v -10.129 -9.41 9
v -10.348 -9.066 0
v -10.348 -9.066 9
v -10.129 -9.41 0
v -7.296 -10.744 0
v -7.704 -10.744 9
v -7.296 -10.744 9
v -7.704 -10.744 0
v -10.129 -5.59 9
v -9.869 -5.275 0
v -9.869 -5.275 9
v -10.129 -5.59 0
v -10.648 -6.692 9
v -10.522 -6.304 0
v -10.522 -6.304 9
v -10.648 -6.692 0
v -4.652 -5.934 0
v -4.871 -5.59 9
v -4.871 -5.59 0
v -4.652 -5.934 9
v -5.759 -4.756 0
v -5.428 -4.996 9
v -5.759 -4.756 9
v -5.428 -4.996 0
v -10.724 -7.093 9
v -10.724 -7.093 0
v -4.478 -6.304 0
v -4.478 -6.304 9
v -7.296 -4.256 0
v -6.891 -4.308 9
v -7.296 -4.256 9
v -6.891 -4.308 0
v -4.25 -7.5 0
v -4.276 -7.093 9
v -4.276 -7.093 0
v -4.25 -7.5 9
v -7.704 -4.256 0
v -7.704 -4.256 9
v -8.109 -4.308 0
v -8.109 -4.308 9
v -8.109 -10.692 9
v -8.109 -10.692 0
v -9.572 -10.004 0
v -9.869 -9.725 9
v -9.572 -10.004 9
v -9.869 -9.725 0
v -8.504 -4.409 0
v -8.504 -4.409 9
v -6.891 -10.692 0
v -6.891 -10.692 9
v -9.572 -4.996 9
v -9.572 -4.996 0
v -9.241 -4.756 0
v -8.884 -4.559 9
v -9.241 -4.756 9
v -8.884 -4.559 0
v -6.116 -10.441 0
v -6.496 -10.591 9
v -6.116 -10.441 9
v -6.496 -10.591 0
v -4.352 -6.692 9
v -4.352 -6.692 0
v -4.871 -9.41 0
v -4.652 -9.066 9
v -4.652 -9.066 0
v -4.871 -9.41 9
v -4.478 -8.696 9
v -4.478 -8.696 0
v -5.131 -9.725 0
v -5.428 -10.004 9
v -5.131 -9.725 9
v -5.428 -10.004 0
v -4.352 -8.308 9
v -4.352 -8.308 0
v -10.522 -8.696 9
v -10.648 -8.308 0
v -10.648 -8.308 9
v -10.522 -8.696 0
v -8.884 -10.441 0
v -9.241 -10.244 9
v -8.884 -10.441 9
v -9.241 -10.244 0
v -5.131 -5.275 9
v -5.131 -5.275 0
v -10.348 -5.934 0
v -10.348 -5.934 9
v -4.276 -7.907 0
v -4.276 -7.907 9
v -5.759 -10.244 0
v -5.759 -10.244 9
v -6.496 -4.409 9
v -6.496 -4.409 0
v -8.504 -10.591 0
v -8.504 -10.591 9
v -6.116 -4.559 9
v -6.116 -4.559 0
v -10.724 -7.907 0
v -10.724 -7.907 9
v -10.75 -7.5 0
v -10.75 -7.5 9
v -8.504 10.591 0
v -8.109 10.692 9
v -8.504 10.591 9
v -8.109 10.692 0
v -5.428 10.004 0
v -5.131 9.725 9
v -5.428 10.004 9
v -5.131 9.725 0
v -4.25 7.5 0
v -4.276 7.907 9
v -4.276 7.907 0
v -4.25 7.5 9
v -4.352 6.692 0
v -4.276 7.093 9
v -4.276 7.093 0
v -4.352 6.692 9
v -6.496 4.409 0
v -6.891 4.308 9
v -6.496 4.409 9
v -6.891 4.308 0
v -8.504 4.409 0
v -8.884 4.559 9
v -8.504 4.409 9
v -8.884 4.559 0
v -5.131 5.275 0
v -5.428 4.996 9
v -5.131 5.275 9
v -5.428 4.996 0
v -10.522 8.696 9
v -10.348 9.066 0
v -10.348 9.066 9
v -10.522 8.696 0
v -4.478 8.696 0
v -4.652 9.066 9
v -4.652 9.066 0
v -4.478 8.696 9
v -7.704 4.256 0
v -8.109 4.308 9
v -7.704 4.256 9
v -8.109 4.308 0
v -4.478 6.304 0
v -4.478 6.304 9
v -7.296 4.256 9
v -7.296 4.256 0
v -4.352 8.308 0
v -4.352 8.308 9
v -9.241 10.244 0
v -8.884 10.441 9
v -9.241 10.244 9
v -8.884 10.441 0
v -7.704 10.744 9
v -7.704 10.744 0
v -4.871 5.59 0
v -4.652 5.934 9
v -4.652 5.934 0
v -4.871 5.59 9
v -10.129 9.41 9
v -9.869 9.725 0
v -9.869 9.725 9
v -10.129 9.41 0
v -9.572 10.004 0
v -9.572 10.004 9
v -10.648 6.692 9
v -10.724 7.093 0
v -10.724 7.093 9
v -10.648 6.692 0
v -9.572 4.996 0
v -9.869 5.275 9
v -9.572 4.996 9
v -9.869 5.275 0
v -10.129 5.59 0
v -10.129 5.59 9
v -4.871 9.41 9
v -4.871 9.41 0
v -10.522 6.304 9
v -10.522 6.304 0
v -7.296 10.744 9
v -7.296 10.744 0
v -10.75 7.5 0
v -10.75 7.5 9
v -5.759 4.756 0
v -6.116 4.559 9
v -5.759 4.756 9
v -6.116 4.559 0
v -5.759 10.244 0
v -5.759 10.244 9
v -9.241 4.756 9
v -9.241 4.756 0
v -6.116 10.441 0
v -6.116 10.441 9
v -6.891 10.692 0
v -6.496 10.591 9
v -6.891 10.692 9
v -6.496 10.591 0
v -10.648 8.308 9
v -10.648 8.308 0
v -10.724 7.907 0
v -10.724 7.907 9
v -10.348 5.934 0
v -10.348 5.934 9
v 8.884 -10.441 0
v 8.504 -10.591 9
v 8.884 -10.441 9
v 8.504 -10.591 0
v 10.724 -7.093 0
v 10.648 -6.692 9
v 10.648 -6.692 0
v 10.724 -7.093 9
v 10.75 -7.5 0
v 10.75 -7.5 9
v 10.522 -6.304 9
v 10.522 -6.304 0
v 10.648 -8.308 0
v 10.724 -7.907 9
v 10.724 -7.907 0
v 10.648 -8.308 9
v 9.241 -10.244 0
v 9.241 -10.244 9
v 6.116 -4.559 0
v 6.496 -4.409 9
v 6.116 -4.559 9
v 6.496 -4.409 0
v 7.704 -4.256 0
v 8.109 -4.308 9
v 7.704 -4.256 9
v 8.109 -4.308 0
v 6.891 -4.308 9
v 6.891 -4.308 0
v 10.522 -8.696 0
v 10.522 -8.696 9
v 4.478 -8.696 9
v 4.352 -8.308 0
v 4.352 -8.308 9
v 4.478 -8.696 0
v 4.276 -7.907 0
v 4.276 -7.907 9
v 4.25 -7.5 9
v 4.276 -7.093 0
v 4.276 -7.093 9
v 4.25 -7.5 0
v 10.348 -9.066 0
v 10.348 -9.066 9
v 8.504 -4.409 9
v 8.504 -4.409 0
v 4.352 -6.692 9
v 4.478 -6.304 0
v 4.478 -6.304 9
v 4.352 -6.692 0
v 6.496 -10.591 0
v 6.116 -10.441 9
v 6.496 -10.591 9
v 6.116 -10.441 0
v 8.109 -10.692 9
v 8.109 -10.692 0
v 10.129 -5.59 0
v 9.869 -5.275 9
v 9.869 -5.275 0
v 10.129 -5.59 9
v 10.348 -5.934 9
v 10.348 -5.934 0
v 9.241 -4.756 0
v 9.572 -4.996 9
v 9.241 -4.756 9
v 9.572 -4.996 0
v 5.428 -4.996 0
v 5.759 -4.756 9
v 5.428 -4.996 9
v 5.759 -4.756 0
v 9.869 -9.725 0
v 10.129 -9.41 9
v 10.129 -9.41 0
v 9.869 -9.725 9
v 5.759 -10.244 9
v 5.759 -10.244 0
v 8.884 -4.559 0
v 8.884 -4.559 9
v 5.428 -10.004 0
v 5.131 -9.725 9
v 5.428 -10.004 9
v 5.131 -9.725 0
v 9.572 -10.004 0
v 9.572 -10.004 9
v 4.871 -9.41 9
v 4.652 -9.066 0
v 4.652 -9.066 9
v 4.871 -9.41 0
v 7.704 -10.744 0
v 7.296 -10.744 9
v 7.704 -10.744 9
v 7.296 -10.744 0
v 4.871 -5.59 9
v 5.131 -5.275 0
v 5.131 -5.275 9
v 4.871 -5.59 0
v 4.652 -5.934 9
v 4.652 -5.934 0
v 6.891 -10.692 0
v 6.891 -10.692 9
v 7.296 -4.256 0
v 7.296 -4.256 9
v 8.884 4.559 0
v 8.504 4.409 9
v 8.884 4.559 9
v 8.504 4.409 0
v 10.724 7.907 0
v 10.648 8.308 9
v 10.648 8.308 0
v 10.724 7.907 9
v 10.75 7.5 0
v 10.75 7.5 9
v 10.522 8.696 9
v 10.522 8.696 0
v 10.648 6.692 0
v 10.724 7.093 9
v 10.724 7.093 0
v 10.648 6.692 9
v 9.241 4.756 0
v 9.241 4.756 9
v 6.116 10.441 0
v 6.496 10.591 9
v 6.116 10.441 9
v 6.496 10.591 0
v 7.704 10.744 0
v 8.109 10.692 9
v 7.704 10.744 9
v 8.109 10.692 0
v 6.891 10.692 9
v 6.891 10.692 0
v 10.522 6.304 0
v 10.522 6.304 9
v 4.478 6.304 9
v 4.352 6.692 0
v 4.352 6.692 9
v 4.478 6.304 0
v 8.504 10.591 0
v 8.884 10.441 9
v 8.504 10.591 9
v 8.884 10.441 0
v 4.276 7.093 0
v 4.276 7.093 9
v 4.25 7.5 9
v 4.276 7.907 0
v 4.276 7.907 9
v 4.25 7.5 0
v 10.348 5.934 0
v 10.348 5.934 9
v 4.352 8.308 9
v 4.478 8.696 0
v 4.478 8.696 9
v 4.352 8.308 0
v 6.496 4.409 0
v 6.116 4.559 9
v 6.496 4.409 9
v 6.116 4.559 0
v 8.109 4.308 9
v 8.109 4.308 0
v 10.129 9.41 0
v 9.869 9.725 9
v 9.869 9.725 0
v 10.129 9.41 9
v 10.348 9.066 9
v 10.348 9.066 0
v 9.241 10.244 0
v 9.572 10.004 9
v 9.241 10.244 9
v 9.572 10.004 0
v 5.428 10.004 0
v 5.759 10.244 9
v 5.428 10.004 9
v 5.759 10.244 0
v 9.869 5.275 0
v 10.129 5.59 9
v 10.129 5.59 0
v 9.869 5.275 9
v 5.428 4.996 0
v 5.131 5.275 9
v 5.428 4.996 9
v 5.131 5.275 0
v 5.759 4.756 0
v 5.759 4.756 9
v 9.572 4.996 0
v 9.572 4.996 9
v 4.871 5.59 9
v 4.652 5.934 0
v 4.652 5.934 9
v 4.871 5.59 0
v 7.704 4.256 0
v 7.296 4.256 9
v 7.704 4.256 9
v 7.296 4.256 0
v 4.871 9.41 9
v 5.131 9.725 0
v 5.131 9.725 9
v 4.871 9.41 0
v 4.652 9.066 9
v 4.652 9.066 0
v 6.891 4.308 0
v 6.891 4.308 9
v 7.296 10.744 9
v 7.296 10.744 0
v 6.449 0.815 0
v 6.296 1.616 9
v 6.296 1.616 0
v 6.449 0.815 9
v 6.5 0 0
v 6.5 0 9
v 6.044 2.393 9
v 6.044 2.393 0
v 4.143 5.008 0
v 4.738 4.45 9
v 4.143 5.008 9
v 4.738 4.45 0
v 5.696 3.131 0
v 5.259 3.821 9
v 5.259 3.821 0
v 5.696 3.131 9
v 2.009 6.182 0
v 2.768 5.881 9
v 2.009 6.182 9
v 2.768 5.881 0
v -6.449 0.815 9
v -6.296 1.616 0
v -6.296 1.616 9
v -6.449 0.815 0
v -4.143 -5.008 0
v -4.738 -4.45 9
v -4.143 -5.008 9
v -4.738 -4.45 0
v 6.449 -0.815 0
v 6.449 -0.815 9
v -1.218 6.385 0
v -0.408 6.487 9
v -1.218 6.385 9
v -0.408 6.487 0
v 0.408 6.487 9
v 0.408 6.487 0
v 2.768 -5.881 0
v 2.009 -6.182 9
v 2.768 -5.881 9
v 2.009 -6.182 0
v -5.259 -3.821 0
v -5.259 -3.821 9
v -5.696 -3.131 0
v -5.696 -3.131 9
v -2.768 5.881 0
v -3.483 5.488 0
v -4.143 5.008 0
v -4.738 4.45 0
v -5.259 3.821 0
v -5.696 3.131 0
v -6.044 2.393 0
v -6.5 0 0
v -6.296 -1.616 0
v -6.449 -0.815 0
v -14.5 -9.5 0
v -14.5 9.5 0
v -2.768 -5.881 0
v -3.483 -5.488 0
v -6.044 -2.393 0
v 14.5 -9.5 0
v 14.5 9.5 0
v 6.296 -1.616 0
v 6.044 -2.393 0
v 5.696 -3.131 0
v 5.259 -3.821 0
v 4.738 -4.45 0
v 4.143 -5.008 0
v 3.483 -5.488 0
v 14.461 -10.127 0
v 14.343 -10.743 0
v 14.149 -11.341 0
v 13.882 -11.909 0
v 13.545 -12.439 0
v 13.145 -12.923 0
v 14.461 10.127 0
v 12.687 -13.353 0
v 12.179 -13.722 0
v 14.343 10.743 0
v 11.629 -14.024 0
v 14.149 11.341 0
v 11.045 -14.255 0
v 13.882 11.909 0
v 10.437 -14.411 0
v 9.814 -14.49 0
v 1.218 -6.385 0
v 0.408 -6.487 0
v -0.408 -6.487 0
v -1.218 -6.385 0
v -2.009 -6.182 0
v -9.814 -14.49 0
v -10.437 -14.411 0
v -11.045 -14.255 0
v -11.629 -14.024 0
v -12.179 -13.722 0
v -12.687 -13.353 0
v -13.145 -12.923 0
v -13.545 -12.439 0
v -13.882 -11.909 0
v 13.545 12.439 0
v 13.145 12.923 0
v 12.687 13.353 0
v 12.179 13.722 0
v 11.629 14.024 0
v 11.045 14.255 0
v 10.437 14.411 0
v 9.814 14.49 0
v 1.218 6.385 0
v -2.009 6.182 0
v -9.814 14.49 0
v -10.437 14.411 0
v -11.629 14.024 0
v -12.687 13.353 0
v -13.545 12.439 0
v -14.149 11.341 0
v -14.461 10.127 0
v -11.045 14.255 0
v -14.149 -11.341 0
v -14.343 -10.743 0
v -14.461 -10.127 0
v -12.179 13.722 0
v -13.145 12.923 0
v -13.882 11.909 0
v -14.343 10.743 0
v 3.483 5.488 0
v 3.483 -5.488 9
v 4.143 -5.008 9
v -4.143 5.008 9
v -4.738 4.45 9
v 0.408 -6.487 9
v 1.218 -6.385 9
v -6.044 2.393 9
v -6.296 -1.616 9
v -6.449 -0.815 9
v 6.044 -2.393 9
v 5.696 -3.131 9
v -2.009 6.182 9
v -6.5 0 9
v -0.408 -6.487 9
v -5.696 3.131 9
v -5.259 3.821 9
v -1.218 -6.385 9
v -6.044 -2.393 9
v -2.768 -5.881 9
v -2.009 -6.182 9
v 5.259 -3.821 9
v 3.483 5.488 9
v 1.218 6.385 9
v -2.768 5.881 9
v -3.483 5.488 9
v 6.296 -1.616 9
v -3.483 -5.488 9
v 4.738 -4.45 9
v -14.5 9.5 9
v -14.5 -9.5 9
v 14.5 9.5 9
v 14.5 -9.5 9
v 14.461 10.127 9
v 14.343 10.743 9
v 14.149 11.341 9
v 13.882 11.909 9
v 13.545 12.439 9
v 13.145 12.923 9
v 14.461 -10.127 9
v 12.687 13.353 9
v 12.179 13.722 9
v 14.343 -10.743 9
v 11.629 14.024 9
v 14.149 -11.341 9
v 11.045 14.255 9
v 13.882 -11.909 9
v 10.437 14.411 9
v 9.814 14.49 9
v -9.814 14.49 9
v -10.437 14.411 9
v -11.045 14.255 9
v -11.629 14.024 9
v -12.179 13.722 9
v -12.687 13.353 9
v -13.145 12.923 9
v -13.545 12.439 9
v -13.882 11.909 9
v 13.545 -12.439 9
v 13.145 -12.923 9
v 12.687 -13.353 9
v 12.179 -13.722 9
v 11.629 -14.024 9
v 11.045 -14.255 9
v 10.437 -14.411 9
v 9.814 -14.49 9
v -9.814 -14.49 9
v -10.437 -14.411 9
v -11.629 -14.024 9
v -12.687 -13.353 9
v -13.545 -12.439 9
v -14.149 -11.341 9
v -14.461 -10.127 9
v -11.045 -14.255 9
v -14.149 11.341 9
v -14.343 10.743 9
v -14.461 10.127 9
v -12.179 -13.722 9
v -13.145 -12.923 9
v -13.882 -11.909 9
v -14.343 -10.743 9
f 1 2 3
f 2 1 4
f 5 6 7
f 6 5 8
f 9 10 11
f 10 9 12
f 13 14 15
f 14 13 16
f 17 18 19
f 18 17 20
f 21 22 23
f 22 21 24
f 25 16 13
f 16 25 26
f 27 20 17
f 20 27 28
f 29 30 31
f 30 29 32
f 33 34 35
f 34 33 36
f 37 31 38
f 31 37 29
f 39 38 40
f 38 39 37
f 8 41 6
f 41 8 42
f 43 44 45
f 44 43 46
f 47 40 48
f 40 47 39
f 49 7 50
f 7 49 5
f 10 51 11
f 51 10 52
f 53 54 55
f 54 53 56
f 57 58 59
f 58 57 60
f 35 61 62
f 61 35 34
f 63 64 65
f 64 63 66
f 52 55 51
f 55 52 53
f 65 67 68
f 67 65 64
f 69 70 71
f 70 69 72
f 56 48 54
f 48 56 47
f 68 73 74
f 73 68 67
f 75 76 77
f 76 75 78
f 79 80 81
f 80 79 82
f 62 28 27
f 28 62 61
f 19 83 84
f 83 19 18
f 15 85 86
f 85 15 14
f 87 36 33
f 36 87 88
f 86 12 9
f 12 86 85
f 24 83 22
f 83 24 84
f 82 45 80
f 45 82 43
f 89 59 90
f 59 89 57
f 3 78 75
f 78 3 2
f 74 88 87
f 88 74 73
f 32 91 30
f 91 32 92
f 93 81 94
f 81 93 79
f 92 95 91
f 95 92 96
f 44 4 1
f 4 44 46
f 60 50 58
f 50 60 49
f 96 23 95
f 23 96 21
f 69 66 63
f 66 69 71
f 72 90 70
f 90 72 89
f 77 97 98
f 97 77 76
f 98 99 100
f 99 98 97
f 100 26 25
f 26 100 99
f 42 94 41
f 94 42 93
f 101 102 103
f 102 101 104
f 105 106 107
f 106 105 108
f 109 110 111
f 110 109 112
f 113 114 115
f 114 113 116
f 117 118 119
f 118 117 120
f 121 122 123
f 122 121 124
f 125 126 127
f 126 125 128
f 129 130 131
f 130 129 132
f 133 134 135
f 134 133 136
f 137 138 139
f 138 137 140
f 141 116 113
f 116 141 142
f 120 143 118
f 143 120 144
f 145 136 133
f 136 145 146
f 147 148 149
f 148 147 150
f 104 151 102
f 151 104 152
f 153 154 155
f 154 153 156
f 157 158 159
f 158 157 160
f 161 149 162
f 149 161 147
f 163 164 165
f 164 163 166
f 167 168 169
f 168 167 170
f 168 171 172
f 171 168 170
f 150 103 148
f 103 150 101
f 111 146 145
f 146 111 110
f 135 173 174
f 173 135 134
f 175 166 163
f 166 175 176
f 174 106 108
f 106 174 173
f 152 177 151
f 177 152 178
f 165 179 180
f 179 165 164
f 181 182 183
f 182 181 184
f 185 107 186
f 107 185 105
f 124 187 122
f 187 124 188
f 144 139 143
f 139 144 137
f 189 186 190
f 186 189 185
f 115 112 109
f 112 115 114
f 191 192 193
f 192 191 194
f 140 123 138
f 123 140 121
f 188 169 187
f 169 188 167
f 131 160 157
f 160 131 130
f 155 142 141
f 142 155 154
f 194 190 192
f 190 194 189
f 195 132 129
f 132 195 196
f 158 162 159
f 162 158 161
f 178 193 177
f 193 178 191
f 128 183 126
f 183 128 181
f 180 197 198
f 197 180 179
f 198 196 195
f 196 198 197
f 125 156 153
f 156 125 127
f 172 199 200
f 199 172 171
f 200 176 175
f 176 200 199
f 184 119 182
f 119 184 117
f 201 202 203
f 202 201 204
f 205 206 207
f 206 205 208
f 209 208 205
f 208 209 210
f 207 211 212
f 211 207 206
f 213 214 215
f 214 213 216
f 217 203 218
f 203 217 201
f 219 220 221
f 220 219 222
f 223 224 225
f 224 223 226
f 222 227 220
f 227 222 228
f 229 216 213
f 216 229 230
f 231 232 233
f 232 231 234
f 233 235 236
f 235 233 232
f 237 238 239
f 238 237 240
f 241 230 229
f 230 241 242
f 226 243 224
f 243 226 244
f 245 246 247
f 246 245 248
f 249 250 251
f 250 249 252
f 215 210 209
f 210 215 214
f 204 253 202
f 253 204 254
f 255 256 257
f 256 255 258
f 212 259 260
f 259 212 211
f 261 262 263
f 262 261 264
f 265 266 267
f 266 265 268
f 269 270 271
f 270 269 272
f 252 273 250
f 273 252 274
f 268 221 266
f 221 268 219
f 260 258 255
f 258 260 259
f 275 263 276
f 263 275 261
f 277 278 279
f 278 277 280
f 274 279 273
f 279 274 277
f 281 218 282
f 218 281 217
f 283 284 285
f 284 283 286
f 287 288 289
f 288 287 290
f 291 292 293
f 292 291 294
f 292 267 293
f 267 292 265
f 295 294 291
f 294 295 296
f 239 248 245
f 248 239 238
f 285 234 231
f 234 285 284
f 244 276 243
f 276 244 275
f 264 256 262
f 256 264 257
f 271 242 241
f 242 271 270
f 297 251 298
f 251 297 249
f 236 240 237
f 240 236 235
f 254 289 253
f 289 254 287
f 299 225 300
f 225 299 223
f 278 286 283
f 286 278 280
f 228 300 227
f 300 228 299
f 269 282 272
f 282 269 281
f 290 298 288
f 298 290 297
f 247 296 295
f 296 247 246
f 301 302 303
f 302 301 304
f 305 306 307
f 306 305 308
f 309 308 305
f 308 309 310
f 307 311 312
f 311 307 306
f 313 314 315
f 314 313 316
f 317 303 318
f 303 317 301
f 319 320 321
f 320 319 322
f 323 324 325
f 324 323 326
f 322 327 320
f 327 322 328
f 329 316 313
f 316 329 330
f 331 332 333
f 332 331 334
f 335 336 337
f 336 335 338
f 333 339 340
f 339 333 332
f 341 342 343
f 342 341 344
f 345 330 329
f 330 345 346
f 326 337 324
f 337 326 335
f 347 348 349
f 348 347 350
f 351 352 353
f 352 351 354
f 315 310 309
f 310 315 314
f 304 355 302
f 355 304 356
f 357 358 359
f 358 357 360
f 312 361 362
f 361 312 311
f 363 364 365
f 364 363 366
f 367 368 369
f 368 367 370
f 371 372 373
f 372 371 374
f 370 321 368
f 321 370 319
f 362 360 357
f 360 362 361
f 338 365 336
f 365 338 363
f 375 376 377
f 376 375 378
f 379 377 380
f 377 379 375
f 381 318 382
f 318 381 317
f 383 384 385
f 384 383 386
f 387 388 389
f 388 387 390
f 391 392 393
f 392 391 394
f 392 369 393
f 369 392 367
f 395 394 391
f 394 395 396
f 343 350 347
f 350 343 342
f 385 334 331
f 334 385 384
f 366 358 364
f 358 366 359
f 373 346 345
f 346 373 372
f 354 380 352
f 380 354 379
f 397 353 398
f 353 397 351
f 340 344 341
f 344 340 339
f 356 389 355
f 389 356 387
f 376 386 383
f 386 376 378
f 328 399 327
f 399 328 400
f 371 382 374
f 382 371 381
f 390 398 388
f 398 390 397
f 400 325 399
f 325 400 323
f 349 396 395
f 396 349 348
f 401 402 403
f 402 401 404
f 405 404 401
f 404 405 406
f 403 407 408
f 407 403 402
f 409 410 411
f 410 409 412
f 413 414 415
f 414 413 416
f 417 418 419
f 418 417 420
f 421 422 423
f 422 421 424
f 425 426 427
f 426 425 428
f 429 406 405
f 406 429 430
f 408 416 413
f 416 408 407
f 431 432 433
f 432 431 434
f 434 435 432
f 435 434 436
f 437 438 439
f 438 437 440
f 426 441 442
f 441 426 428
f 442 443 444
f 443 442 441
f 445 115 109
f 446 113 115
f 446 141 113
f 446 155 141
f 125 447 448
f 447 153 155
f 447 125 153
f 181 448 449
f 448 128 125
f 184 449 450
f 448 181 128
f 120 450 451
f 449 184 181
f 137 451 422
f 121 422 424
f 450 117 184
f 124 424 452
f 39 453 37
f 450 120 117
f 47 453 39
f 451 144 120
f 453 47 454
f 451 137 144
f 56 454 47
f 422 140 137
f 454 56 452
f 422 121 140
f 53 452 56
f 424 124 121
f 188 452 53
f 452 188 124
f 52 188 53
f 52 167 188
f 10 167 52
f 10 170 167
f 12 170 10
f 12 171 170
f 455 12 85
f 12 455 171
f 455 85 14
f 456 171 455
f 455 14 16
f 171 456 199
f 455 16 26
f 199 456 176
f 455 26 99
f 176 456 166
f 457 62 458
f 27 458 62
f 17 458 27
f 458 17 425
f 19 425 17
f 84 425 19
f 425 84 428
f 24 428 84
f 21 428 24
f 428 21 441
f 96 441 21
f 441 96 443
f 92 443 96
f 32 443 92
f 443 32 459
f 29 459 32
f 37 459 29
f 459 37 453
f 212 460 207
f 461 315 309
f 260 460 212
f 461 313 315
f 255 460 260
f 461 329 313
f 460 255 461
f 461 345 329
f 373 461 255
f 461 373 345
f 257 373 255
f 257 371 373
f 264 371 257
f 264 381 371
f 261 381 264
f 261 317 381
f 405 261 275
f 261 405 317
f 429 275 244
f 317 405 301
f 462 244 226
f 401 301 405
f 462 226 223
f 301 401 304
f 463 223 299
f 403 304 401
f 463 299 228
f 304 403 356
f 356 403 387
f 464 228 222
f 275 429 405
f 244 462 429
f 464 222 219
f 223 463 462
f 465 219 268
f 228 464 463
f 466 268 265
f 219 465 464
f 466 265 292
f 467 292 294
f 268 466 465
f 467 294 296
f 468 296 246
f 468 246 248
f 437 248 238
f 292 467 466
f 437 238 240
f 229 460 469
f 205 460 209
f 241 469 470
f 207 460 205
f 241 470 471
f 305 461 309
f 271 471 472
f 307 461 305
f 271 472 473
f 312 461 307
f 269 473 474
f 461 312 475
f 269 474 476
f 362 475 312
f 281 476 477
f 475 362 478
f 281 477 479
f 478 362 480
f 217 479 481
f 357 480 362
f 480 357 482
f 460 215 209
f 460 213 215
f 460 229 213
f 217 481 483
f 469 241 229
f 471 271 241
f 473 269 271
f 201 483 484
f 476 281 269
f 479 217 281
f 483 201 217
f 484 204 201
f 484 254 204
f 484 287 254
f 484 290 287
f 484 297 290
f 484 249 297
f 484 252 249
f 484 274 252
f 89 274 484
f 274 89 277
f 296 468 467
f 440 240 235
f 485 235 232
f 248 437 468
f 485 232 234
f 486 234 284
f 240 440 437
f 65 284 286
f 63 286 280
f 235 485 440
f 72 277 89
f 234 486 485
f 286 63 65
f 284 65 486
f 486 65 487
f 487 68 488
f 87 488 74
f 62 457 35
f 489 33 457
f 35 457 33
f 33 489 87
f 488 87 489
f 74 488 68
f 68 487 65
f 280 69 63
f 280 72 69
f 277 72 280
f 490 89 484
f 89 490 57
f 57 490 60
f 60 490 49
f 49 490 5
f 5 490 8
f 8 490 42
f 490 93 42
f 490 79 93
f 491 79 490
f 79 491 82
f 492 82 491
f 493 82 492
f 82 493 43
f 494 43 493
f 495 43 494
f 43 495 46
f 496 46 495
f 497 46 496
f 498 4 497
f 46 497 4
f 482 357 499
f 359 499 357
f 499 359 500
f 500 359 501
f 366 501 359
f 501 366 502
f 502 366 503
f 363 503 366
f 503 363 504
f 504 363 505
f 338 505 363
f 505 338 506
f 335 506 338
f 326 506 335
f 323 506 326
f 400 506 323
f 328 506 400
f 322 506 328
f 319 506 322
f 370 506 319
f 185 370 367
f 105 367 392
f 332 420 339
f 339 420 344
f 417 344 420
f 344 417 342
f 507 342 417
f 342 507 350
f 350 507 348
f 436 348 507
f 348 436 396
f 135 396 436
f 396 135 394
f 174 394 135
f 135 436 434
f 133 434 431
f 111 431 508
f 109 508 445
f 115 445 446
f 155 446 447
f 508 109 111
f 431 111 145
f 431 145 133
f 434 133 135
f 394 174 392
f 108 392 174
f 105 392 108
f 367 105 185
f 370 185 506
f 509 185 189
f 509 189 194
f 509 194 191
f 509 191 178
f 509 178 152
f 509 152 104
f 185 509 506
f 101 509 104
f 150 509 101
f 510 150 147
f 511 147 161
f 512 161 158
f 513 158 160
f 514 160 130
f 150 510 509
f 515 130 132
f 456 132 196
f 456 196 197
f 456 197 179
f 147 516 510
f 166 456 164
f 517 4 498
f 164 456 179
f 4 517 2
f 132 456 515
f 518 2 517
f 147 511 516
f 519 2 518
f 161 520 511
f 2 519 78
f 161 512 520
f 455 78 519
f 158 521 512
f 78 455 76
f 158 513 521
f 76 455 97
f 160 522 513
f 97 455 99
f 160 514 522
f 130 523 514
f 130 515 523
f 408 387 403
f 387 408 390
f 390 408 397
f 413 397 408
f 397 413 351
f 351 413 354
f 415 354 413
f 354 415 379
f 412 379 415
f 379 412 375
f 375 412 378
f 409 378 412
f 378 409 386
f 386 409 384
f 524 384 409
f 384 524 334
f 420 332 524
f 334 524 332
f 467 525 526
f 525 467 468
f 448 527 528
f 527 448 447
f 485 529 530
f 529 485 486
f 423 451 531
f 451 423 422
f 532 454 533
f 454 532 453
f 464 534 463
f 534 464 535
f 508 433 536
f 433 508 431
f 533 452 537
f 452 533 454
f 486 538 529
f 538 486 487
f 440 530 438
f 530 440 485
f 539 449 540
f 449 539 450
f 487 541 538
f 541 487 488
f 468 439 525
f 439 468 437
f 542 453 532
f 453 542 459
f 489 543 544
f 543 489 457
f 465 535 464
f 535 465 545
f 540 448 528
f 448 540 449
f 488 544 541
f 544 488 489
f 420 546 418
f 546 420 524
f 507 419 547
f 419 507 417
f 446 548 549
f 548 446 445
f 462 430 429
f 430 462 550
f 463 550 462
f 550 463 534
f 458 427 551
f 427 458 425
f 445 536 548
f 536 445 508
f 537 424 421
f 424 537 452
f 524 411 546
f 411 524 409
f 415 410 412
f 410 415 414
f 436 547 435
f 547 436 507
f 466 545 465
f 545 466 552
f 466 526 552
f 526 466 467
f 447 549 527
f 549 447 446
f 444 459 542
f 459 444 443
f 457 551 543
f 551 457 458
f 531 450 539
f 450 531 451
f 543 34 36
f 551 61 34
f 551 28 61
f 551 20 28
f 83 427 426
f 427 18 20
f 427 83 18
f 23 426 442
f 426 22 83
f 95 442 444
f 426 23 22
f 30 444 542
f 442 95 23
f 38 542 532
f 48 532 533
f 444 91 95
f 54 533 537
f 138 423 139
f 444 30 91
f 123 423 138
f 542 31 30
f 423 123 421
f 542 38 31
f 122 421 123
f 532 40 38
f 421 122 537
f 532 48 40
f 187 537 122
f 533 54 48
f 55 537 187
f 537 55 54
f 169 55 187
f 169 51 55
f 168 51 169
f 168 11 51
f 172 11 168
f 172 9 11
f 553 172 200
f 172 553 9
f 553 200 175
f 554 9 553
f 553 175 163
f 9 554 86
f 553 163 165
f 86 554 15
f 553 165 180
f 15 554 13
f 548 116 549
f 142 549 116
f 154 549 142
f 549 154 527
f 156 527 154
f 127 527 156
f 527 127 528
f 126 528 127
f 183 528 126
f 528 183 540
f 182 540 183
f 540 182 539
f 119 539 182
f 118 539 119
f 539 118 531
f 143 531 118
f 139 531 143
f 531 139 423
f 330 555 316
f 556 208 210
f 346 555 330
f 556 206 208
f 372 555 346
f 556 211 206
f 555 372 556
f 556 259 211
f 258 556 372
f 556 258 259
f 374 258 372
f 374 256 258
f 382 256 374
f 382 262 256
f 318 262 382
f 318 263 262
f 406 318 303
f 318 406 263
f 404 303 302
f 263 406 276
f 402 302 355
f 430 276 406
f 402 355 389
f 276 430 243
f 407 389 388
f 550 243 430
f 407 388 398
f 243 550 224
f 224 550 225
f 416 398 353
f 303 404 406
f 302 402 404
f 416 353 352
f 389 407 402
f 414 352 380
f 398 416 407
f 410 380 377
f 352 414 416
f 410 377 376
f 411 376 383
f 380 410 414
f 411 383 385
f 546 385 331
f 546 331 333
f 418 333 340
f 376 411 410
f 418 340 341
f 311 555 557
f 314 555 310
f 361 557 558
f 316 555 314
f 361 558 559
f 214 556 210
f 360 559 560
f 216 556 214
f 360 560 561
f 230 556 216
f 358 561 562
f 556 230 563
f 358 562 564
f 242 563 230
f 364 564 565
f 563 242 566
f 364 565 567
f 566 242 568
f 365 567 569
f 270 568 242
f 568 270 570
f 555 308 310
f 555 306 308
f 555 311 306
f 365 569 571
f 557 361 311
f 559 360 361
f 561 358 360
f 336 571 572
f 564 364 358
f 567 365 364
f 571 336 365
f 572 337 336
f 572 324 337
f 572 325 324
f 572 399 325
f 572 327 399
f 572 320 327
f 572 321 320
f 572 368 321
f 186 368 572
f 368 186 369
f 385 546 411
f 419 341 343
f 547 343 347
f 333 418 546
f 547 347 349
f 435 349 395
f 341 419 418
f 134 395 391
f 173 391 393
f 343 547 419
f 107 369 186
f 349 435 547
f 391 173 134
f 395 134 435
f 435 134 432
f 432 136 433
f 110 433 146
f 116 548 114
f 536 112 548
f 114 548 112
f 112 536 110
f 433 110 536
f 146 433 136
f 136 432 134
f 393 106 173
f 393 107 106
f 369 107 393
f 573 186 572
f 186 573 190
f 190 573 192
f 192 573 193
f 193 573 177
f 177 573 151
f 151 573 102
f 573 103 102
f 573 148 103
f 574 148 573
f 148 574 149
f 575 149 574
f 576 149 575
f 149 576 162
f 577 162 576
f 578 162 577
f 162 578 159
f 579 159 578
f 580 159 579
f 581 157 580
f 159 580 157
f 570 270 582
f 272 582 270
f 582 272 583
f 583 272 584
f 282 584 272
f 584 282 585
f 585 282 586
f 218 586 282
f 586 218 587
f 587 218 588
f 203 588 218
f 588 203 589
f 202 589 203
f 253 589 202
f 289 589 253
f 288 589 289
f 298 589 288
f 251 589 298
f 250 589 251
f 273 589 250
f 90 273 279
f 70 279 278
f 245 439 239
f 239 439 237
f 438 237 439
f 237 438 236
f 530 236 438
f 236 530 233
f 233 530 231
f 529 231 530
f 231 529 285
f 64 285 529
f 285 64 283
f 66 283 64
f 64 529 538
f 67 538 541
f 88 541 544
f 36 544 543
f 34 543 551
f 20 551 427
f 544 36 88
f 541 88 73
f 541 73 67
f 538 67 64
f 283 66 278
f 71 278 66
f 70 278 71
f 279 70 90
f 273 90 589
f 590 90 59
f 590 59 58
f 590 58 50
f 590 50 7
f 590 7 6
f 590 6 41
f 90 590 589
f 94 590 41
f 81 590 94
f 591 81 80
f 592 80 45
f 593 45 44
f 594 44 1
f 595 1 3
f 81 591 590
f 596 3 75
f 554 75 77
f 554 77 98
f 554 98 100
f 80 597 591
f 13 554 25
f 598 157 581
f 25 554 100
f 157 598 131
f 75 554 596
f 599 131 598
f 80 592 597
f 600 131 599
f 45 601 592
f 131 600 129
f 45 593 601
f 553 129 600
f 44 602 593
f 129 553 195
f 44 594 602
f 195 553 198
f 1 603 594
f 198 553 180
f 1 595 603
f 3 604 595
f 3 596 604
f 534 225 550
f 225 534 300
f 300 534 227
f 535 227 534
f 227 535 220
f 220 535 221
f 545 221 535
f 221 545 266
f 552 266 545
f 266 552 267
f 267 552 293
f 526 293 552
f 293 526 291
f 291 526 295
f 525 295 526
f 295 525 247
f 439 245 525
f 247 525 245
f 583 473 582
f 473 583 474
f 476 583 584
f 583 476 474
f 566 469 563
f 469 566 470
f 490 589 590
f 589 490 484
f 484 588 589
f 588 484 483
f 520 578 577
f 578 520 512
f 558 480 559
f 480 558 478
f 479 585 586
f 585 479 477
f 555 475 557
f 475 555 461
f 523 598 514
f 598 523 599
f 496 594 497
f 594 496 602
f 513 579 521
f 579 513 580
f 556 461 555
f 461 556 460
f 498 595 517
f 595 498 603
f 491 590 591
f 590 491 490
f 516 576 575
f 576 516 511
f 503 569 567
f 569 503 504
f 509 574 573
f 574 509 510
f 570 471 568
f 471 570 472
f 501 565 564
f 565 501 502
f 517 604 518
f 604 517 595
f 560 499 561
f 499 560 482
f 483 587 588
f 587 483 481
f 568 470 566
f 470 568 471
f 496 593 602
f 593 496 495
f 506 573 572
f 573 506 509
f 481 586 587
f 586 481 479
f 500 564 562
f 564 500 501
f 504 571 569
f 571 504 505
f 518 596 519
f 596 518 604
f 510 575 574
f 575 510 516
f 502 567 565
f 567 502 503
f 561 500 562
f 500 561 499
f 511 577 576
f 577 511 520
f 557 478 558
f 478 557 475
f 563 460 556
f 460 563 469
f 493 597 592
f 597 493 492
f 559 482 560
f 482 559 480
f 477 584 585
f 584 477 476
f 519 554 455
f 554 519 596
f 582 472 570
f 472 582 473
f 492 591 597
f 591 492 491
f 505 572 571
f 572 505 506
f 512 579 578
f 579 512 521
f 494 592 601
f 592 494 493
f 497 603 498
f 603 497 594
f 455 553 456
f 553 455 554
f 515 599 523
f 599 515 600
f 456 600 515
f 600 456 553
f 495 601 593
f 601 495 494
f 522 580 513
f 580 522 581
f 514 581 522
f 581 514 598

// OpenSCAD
$fn = 50;


difference() {
	union() {
		hull() {
			translate(v = [-9.5000000000, 9.5000000000, 0]) {
				cylinder(h = 9, r = 5);
			}
			translate(v = [9.5000000000, 9.5000000000, 0]) {
				cylinder(h = 9, r = 5);
			}
			translate(v = [-9.5000000000, -9.5000000000, 0]) {
				cylinder(h = 9, r = 5);
			}
			translate(v = [9.5000000000, -9.5000000000, 0]) {
				cylinder(h = 9, r = 5);
			}
		}
	}
	union() {
		#translate(v = [-7.5000000000, -7.5000000000, -100.0000000000]) {
			cylinder(h = 200, r = 3.2500000000);
		}
		#translate(v = [-7.5000000000, 7.5000000000, -100.0000000000]) {
			cylinder(h = 200, r = 3.2500000000);
		}
		#translate(v = [7.5000000000, -7.5000000000, -100.0000000000]) {
			cylinder(h = 200, r = 3.2500000000);
		}
		#translate(v = [7.5000000000, 7.5000000000, -100.0000000000]) {
			cylinder(h = 200, r = 3.2500000000);
		}
		#cylinder(h = 9, r = 6.5000000000);
	}
}
